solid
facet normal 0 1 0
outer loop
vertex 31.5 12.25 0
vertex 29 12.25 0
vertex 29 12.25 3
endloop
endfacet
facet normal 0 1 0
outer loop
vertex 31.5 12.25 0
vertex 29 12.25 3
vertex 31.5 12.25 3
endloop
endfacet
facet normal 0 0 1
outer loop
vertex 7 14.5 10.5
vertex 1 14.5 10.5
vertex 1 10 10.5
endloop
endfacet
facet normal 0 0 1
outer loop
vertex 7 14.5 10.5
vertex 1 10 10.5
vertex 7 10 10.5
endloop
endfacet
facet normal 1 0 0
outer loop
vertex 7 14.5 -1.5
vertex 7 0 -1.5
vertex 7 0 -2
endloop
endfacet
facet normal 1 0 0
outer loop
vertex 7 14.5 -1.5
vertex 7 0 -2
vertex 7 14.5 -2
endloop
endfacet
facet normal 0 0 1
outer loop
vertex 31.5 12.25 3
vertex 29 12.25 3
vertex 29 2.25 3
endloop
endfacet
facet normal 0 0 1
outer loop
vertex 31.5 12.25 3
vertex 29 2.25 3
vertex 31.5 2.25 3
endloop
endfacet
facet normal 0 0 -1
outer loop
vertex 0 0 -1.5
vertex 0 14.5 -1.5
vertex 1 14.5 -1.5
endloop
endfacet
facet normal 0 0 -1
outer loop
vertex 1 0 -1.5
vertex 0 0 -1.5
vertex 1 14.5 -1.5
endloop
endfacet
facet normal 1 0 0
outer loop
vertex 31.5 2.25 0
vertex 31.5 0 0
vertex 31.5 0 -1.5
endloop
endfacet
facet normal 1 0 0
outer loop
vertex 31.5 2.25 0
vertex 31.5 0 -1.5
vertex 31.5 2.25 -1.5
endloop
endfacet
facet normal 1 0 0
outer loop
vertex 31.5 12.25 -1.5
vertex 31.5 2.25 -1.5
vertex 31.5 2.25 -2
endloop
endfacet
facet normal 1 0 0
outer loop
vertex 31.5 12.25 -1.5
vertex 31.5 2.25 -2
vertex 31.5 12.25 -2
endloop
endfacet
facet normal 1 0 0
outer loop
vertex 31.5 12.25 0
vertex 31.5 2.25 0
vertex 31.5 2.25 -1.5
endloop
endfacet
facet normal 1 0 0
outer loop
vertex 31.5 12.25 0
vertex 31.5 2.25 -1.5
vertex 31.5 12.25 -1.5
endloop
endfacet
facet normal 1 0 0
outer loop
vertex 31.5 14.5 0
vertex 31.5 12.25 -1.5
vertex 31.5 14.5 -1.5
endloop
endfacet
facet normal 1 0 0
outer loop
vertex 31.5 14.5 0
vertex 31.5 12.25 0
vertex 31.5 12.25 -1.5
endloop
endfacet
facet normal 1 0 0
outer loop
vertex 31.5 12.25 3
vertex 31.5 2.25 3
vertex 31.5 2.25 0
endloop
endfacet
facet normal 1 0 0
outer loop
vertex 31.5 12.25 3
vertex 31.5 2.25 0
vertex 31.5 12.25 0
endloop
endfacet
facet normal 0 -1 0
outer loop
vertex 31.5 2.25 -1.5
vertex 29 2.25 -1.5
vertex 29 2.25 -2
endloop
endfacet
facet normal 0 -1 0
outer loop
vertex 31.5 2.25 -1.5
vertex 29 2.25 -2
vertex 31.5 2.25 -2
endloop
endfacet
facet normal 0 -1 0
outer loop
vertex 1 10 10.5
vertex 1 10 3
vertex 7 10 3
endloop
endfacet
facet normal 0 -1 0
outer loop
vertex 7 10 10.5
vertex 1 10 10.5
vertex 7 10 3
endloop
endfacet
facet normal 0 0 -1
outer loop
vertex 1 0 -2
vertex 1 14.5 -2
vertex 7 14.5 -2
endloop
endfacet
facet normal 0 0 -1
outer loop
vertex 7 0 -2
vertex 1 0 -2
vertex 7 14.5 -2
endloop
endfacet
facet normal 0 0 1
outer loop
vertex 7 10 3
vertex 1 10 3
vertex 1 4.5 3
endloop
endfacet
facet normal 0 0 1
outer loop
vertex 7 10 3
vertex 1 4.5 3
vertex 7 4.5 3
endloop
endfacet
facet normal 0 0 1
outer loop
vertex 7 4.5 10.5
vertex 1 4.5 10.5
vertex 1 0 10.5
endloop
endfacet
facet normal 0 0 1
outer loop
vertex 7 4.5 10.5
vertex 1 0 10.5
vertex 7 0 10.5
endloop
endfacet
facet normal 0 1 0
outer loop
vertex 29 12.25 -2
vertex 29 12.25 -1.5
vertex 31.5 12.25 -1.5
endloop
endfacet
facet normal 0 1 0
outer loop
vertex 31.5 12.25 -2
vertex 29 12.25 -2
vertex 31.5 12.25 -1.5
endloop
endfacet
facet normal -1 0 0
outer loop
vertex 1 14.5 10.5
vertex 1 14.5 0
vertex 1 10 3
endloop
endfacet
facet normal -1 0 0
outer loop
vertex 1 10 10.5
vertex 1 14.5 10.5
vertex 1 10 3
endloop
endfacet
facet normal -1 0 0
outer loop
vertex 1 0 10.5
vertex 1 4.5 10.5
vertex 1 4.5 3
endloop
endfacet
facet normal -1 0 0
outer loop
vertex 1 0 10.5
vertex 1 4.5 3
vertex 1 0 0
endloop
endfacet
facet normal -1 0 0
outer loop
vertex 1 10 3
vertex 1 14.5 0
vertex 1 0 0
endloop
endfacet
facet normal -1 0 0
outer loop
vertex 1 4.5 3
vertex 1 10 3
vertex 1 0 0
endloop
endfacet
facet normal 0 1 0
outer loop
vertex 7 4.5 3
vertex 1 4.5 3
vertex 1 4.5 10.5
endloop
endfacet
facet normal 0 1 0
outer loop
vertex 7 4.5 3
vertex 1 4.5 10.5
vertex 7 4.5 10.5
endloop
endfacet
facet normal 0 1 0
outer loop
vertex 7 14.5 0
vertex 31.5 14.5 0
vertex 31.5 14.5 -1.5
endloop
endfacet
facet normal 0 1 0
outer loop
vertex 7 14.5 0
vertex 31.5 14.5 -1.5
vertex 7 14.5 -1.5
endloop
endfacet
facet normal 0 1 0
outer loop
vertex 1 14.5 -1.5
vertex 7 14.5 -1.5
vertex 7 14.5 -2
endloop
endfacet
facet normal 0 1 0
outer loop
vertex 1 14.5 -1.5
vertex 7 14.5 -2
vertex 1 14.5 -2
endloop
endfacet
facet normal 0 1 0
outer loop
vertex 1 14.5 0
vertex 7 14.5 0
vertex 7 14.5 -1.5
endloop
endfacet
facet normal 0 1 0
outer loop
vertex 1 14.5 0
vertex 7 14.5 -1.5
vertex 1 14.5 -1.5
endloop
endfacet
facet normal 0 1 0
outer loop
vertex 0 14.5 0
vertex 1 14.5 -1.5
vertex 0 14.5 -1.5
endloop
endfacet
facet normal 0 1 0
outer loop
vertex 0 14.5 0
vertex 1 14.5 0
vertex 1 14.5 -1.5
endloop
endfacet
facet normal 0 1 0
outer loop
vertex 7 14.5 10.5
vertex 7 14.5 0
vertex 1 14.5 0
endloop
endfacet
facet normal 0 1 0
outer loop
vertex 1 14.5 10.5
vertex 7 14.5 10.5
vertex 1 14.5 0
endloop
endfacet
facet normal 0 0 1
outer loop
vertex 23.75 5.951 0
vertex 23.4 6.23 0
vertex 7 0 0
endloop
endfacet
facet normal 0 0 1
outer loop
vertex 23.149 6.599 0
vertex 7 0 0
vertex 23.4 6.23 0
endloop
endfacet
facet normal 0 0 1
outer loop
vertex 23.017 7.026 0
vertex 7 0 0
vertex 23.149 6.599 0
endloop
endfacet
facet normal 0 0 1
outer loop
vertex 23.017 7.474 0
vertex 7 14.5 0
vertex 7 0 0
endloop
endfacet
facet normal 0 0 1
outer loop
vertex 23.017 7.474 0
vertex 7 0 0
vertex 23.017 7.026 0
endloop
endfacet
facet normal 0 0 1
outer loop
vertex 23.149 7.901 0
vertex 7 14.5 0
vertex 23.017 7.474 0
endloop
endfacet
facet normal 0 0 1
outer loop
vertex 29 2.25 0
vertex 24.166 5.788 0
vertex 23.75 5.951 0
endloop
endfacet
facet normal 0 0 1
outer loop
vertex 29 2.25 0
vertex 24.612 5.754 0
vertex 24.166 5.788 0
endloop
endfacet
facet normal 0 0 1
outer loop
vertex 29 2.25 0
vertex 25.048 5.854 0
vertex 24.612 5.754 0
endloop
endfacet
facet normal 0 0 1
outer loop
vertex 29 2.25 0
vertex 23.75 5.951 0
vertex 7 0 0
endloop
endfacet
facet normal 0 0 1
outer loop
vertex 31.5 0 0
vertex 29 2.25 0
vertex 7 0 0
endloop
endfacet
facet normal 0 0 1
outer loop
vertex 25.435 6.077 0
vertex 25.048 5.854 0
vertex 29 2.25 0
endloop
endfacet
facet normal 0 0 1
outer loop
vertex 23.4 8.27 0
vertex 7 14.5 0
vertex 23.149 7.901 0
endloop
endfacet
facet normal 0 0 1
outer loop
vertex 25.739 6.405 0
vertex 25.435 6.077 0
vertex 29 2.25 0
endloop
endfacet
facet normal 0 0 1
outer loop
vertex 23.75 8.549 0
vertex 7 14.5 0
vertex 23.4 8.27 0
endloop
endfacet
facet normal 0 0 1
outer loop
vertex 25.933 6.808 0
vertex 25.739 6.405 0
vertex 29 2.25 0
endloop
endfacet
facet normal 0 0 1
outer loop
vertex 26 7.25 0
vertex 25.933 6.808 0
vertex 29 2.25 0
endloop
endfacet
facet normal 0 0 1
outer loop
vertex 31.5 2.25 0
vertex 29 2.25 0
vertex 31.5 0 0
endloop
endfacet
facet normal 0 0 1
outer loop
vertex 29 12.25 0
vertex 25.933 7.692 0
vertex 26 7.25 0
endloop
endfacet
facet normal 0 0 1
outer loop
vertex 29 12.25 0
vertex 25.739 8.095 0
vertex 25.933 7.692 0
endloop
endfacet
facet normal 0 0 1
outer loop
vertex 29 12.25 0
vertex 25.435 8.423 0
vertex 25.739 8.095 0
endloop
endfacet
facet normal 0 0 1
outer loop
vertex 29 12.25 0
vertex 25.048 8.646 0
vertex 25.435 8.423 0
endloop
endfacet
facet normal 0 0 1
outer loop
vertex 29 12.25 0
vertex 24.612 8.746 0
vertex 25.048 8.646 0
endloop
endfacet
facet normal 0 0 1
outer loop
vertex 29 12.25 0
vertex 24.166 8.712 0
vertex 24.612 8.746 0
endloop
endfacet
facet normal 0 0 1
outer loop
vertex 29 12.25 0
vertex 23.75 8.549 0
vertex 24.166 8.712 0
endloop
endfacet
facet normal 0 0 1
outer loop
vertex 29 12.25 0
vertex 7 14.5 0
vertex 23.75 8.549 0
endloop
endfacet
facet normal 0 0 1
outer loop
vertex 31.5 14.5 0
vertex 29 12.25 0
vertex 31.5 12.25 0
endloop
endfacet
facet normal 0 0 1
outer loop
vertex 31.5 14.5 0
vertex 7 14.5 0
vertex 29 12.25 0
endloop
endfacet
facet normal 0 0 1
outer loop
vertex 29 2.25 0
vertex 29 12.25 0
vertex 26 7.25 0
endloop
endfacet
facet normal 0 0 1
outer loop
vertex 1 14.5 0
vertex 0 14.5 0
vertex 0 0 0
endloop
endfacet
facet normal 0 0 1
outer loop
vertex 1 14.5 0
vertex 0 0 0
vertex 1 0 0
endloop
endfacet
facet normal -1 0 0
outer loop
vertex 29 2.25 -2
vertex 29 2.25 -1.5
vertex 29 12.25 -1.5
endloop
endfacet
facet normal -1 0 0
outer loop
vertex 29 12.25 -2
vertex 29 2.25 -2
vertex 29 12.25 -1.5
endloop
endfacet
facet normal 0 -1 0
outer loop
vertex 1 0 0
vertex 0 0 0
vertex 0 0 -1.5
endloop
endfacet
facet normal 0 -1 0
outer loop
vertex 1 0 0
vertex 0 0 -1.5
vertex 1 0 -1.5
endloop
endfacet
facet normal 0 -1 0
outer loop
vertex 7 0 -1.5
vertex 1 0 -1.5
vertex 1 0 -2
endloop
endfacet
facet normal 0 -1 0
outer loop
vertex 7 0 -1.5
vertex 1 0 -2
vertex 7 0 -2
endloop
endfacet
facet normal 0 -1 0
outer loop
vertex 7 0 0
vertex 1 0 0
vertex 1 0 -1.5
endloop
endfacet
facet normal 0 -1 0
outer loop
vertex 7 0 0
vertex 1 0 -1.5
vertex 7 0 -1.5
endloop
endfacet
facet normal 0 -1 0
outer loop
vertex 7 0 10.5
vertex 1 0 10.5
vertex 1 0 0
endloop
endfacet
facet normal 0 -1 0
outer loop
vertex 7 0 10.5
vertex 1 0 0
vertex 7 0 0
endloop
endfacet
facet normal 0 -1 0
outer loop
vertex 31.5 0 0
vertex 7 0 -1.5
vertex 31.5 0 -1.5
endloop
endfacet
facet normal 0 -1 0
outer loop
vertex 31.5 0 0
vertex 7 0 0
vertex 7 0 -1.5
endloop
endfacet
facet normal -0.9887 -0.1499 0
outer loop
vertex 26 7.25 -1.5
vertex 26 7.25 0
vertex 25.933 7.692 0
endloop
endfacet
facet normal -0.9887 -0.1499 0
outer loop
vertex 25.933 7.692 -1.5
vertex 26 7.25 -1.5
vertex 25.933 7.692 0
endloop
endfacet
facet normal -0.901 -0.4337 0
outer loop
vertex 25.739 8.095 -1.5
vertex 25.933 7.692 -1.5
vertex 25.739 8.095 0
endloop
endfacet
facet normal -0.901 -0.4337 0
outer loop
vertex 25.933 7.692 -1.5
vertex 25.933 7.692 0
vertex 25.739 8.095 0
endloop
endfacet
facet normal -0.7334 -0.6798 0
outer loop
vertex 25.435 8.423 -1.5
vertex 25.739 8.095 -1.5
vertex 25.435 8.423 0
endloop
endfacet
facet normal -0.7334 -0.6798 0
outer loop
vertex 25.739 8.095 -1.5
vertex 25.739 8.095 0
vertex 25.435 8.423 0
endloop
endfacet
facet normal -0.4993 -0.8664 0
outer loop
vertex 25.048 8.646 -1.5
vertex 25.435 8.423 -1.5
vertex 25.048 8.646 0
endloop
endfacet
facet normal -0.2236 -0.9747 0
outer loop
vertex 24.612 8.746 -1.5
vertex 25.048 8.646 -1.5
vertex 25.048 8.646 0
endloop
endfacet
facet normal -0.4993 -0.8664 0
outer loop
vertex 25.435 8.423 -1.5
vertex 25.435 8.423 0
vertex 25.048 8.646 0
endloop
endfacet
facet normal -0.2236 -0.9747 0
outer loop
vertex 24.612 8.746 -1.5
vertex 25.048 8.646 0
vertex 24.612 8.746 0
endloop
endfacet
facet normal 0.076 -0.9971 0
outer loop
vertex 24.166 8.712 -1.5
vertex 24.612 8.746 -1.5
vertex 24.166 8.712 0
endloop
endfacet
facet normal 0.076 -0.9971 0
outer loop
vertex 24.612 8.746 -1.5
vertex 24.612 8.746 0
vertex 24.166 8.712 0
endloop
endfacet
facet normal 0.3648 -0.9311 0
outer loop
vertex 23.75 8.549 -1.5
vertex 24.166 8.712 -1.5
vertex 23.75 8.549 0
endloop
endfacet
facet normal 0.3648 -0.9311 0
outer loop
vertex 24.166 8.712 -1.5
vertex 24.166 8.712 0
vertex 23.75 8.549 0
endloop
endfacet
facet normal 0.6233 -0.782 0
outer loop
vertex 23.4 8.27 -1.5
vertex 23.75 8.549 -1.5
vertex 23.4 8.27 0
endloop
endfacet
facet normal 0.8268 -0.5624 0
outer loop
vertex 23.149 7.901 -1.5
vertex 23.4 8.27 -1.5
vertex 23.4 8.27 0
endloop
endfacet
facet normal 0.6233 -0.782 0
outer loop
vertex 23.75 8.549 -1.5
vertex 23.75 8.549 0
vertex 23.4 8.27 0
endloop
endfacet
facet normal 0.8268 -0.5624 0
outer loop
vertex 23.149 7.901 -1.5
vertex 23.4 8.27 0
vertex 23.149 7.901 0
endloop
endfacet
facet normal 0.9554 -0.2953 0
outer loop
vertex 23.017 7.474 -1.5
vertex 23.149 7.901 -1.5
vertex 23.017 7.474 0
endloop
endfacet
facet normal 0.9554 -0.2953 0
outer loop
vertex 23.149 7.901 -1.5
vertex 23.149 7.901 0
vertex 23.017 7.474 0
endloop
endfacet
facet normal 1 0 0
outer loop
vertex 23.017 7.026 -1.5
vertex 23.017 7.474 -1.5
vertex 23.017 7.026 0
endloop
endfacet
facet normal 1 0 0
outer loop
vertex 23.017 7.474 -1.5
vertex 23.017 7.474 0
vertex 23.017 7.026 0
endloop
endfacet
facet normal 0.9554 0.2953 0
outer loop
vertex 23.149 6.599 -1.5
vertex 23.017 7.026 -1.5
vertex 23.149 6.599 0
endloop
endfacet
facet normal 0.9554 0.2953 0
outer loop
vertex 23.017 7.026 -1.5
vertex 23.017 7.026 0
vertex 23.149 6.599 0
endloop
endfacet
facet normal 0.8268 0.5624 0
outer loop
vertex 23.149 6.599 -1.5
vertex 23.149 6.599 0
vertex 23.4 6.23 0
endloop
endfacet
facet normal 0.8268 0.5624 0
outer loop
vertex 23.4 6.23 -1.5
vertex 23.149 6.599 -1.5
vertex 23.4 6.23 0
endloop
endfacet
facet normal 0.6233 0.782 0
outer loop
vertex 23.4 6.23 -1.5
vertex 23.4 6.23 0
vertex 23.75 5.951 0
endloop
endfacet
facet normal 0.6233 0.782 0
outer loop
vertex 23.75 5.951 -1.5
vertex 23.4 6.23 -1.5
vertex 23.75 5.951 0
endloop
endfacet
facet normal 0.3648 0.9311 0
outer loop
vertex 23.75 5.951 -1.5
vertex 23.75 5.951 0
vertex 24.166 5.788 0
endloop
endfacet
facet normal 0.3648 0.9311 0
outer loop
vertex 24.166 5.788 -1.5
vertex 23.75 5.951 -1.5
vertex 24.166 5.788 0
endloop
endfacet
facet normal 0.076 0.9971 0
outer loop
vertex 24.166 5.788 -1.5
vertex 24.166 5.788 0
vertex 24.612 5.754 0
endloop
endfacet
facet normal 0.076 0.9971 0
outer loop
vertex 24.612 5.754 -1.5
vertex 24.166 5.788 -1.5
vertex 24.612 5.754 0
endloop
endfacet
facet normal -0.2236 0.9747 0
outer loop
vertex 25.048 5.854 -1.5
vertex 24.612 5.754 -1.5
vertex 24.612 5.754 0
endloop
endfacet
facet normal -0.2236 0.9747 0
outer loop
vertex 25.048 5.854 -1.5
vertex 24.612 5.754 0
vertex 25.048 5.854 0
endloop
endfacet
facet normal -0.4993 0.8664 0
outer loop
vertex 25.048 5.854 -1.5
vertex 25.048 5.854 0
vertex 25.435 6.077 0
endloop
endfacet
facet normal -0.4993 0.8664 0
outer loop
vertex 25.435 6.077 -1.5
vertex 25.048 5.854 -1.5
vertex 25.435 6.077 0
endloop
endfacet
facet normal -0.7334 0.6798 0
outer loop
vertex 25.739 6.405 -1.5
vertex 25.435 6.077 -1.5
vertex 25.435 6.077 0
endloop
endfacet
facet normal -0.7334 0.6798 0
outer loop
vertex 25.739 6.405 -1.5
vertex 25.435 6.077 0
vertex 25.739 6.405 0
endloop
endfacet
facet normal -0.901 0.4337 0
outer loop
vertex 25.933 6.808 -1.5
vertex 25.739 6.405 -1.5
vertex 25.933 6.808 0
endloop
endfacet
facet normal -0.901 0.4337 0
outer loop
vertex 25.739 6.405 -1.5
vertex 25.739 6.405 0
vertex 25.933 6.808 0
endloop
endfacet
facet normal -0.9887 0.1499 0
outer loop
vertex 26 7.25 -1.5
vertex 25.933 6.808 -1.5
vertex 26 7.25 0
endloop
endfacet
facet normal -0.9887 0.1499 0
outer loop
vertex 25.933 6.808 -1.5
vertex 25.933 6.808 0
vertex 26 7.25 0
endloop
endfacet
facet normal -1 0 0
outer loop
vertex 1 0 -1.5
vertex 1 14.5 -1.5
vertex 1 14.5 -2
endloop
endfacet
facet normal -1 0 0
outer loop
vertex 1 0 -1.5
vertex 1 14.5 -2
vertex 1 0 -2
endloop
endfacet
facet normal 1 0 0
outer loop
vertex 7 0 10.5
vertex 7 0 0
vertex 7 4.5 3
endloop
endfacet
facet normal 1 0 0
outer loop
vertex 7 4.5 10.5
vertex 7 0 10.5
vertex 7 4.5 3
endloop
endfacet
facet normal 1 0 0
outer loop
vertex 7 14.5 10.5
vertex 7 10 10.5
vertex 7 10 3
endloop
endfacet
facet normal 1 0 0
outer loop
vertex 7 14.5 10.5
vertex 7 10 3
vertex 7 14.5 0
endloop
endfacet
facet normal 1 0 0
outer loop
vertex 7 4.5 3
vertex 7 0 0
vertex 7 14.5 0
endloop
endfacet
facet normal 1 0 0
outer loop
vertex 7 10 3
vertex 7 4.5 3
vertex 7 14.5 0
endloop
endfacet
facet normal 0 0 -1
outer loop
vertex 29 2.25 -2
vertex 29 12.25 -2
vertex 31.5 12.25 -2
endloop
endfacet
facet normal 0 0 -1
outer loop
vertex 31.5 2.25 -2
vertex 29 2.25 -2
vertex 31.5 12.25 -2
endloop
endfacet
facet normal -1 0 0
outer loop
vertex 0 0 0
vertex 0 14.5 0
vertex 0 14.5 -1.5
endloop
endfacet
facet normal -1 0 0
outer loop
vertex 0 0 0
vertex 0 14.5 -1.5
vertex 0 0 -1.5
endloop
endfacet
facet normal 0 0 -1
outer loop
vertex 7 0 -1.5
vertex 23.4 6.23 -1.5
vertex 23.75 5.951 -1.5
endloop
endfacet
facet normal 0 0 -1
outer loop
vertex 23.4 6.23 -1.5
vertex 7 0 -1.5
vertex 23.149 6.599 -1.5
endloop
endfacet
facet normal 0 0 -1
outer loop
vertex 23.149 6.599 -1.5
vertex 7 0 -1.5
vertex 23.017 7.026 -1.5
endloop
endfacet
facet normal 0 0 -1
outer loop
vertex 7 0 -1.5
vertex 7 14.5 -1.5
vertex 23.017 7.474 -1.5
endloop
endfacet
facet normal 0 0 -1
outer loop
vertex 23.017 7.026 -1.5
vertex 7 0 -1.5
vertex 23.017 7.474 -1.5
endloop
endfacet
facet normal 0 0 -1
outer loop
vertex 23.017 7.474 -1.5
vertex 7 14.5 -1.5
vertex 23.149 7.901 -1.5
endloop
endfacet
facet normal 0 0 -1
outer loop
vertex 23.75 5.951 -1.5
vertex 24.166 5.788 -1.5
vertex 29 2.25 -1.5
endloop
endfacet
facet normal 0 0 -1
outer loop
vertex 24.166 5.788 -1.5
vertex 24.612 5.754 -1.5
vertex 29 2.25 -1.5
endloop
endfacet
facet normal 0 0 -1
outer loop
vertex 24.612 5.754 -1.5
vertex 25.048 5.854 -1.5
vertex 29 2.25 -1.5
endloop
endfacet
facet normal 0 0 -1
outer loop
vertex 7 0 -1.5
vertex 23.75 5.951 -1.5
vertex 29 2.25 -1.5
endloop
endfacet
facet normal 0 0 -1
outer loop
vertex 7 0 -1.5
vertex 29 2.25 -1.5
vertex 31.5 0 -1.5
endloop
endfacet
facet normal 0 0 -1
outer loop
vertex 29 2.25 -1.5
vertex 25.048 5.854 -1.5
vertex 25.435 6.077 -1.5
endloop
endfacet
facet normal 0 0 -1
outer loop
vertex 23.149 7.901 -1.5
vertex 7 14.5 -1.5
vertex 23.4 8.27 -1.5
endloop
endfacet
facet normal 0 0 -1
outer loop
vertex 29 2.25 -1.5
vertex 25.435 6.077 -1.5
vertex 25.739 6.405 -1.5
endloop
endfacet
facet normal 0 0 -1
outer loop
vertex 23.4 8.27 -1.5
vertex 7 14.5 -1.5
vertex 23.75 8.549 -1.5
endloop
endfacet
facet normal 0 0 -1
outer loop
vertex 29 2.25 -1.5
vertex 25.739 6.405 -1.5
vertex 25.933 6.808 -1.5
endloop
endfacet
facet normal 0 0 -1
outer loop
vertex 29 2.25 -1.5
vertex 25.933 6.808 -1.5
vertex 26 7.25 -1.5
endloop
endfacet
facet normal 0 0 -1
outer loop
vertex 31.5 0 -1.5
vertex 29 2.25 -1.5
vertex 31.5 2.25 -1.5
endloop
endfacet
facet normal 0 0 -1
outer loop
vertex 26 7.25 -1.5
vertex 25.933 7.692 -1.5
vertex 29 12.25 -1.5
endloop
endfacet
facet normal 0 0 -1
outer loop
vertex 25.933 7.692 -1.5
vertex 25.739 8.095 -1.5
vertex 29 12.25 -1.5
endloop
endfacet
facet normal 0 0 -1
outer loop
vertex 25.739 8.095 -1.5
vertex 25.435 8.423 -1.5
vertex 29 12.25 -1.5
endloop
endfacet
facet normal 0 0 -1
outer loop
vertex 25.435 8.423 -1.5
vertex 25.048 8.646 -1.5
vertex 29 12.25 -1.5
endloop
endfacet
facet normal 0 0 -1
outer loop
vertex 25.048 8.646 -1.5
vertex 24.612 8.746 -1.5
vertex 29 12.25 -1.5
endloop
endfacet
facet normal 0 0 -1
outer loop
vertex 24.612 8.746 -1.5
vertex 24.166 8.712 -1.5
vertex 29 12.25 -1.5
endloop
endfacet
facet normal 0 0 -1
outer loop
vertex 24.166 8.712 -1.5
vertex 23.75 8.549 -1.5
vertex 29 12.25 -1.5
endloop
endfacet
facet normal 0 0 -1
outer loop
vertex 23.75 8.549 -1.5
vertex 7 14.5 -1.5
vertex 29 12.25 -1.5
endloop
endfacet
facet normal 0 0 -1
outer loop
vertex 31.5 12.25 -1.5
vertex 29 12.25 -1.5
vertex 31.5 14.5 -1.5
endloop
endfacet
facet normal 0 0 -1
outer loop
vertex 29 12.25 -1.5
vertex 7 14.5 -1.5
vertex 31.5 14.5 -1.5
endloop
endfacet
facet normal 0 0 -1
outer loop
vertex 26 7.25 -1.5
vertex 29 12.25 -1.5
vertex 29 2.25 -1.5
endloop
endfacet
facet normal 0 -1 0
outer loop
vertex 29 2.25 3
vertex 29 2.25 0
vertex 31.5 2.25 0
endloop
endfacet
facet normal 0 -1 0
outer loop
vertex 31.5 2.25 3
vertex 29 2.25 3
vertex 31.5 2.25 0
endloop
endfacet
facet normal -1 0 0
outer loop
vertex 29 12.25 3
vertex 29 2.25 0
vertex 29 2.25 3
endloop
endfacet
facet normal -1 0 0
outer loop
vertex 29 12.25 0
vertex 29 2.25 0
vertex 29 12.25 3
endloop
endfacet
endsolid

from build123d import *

# Parameters (mm, degrees)
F0_W     = 6
F0_H     = 4.5
F0_H_2   = 5.5
F0_R     = 1.5
F0_W_2   = 2.5
F0_H_3   = 10
F1_DEPTH = 1.5
F2_DEPTH = 3
F3_DEPTH = 10.5
F4_DEPTH = 2


with BuildPart() as f1:
    # F0 (on Top) → F1 (new body)
    with BuildSketch(Plane.XY):
        Polygon((0, 14.5), (0, 0), (1, 0), (1, 4.5), (1, 10), (1, 14.5), align=None)
        with Locations((4, 12.25)):
            Rectangle(F0_W, F0_H)
        with Locations((4, 7.25)):
            Rectangle(F0_W, F0_H_2)
        with Locations((4, 2.25)):
            Rectangle(F0_W, F0_H)
        Polygon((7, 4.5), (7, 0), (31.5, 0), (31.5, 2.25), (29, 2.25), (29, 12.25), (31.5, 12.25), (31.5, 14.5), (7, 14.5), (7, 10), align=None)
        with Locations((24.5, 7.25)):
            Circle(F0_R, mode=Mode.SUBTRACT)
        with Locations((30.25, 7.25)):
            Rectangle(F0_W_2, F0_H_3)
    extrude(amount=-F1_DEPTH)

    # F0 (on Top) → F2 (join)
    with BuildSketch(Plane.XY):
        with Locations((30.25, 7.25)):
            Rectangle(F0_W_2, F0_H_3)
        with Locations((4, 12.25)):
            Rectangle(F0_W, F0_H)
        with Locations((4, 7.25)):
            Rectangle(F0_W, F0_H_2)
        with Locations((4, 2.25)):
            Rectangle(F0_W, F0_H)
    extrude(amount=F2_DEPTH)

    # F0 (on Top) → F3 (join)
    with BuildSketch(Plane.XY):
        with Locations((4, 12.25)):
            Rectangle(F0_W, F0_H)
        with Locations((4, 2.25)):
            Rectangle(F0_W, F0_H)
    extrude(amount=F3_DEPTH)

    # F0 (on Top) → F4 (join)
    with BuildSketch(Plane.XY):
        with Locations((4, 12.25)):
            Rectangle(F0_W, F0_H)
        with Locations((4, 7.25)):
            Rectangle(F0_W, F0_H_2)
        with Locations((4, 2.25)):
            Rectangle(F0_W, F0_H)
        with Locations((30.25, 7.25)):
            Rectangle(F0_W_2, F0_H_3)
    extrude(amount=-F4_DEPTH)


solid = f1.part
